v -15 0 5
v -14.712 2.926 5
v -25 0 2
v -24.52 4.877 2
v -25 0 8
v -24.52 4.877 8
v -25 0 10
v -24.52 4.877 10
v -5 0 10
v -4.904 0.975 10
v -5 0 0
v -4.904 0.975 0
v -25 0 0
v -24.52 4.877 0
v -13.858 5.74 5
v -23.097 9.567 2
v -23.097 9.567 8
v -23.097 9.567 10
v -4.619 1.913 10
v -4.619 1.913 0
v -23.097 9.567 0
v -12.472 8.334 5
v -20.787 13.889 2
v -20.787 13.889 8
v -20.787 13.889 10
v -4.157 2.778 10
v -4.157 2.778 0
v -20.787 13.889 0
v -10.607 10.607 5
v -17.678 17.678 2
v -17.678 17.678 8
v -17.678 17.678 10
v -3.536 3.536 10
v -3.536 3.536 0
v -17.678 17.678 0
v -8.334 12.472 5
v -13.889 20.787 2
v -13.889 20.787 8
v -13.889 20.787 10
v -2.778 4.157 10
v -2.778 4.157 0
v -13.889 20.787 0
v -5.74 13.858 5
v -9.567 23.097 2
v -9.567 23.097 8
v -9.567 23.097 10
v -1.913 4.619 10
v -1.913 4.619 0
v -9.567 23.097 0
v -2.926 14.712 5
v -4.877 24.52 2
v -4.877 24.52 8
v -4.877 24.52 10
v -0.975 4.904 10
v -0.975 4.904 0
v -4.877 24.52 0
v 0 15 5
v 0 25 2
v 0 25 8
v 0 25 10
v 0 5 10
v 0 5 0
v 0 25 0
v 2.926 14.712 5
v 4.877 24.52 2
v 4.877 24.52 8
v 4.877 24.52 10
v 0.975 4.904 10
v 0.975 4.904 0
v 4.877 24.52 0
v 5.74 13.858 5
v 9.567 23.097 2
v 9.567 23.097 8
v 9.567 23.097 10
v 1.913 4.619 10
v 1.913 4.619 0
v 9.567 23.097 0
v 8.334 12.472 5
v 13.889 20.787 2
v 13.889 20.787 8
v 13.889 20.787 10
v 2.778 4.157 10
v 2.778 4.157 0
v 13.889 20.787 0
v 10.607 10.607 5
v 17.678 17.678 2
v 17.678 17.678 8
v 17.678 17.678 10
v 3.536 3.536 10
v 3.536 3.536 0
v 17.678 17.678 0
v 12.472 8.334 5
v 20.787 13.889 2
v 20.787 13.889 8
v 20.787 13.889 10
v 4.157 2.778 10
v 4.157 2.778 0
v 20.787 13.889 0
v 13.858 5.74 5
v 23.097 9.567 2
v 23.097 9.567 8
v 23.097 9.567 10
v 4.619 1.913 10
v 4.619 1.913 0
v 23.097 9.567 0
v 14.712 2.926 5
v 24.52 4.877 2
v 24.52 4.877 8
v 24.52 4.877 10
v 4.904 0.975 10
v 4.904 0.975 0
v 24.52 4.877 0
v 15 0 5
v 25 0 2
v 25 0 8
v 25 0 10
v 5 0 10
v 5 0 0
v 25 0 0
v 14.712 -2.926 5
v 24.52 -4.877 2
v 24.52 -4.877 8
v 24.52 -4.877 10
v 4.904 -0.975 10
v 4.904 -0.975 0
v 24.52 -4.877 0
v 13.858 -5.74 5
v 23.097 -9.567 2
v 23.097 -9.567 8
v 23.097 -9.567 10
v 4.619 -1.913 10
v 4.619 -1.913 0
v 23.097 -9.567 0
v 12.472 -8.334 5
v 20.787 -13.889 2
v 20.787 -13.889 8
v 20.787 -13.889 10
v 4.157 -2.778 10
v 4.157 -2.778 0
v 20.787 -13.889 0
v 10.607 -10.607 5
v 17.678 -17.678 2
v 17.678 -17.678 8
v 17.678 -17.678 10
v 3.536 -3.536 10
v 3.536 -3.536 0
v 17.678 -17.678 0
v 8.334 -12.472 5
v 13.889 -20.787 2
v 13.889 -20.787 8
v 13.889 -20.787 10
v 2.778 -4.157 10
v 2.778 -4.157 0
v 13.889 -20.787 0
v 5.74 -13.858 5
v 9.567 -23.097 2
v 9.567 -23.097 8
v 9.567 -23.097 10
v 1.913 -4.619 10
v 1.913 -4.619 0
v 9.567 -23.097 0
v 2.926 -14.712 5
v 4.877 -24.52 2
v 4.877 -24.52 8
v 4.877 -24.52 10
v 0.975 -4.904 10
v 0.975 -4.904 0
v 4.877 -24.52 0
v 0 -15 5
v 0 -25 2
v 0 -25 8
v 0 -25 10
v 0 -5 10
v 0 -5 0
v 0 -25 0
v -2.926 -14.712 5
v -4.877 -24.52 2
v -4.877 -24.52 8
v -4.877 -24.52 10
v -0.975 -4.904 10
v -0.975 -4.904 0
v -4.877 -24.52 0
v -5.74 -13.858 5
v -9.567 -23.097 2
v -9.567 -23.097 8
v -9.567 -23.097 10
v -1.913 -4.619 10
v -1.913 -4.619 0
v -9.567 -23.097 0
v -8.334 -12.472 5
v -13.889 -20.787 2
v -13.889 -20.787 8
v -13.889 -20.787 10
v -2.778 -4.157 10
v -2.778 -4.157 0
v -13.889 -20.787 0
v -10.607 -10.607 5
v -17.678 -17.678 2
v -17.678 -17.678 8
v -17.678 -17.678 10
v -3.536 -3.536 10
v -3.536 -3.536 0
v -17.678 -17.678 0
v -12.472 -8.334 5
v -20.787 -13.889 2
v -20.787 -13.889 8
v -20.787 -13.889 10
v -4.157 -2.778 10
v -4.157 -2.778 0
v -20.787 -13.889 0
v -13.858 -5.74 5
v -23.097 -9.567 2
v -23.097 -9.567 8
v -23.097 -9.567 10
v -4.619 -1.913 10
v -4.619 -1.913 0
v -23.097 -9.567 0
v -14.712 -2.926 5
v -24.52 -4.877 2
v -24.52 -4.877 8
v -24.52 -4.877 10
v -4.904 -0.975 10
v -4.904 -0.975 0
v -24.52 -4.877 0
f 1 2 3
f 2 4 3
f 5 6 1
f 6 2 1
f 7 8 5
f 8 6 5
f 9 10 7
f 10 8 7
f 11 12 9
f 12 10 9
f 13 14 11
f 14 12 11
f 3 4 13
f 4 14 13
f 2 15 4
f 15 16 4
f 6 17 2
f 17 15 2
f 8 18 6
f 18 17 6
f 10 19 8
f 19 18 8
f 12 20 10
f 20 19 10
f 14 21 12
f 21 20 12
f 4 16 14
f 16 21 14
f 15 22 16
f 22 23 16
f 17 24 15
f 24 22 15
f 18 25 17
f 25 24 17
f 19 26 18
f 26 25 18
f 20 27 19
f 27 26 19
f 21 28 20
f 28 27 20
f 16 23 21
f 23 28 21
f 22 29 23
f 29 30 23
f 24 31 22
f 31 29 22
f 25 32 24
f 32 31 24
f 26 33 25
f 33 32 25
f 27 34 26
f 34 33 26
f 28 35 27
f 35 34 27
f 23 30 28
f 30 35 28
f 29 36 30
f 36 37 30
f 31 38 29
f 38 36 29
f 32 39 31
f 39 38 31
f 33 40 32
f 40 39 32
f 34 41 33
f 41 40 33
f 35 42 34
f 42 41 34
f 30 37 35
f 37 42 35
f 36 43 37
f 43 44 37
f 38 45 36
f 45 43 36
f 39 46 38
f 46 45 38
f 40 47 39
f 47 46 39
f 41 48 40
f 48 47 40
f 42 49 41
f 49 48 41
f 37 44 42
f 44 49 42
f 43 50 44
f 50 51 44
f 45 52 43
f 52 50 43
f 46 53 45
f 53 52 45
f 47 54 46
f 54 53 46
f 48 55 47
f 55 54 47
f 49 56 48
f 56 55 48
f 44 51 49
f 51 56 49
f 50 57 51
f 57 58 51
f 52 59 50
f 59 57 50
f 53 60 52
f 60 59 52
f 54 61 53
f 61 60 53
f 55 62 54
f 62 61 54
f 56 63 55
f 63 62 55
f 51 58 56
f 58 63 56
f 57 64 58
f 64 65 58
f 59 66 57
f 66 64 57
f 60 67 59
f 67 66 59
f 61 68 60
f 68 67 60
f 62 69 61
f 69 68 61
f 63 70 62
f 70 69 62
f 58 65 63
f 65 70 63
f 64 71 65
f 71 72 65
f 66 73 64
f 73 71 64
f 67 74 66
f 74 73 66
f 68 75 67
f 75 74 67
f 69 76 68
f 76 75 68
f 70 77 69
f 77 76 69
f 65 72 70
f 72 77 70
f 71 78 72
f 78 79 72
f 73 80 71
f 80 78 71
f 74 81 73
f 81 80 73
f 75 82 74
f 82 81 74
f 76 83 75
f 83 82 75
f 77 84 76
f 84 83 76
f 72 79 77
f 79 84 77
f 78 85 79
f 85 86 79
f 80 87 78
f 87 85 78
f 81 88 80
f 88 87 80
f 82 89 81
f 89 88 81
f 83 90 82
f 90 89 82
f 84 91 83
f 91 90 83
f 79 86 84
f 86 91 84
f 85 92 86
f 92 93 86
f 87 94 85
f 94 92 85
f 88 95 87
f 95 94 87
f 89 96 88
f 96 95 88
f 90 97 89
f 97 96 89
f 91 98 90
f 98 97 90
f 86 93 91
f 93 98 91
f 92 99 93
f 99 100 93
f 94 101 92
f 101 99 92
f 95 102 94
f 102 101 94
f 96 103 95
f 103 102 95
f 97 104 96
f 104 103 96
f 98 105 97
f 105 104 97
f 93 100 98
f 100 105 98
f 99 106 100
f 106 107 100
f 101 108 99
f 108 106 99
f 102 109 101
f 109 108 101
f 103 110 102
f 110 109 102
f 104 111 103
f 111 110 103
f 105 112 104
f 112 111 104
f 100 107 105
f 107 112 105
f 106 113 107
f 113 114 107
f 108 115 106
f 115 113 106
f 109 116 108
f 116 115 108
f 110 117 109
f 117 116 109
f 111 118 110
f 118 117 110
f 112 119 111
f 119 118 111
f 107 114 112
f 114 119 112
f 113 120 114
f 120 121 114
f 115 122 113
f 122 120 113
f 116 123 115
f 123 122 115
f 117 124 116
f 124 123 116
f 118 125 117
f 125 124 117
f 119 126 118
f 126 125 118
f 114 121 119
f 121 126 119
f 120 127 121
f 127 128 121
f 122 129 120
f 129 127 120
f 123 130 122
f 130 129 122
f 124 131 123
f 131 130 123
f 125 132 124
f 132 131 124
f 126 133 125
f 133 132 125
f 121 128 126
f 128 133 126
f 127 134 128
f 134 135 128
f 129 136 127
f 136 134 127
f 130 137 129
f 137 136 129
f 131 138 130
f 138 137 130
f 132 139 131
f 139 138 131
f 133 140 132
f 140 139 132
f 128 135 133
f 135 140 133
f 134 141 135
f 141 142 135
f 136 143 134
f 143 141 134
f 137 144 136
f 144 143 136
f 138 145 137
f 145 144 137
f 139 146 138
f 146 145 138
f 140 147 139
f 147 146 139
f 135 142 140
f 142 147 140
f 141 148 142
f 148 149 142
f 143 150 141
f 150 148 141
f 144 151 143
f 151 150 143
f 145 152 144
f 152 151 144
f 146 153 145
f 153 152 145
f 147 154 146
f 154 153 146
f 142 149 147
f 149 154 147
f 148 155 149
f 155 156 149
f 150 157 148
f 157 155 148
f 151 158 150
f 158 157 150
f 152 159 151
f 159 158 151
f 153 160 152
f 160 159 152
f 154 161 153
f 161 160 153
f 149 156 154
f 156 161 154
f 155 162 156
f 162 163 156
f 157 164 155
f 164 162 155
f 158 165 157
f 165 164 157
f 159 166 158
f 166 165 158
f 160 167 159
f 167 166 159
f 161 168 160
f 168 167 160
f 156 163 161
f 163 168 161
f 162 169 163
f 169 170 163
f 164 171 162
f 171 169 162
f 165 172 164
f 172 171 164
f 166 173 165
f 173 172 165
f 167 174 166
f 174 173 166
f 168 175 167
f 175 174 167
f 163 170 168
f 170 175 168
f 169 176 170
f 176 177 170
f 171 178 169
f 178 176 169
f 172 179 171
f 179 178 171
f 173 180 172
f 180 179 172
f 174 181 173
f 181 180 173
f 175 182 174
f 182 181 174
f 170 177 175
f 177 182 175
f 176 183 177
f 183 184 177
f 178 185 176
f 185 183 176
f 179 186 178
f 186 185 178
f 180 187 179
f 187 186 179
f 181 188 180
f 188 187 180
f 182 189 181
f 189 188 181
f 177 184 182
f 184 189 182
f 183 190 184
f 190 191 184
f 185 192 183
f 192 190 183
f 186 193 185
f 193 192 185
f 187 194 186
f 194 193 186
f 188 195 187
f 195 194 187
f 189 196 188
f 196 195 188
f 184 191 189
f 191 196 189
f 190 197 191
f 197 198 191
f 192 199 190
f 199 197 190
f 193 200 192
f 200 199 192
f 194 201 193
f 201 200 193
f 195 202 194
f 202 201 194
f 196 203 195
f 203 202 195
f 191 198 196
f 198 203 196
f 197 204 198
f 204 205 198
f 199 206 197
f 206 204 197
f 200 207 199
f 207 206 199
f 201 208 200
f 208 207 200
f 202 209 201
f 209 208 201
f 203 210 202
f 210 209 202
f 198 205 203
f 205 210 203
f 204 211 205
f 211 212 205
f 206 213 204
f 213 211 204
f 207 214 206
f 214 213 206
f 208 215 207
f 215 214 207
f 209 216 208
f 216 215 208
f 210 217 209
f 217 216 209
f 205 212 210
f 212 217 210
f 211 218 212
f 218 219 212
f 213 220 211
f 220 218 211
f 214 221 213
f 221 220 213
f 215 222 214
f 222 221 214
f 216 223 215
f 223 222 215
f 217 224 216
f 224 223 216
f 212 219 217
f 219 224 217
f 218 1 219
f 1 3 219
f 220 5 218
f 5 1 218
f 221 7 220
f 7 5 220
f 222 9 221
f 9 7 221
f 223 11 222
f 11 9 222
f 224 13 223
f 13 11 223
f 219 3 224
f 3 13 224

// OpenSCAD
$fn = 32;

// ----------------------------------------------------------------------
// Revolved part: V-groove pulley R25
// ----------------------------------------------------------------------

// --- parameters (mm) ---
bore_r = 5;               // bore radius
rim_r = 25;               // rim radius
rim_t = 10;               // rim width
groove_r = 15;            // groove root radius
groove_w = 3;             // groove half width
revolve_angle = 360;      // revolve sweep, degrees

bore_d = 2 * bore_r;
rim_d = 2 * rim_r;
groove_d = 2 * groove_r;

profile = [[5, 0], [25, 0], [25, 2], [15, 5], [25, 8], [25, 10], [5, 10]];  // primary outline, 7 points, counter clockwise

// --- the one profile operation ---
rotate_extrude(angle = revolve_angle) polygon(points = profile);
